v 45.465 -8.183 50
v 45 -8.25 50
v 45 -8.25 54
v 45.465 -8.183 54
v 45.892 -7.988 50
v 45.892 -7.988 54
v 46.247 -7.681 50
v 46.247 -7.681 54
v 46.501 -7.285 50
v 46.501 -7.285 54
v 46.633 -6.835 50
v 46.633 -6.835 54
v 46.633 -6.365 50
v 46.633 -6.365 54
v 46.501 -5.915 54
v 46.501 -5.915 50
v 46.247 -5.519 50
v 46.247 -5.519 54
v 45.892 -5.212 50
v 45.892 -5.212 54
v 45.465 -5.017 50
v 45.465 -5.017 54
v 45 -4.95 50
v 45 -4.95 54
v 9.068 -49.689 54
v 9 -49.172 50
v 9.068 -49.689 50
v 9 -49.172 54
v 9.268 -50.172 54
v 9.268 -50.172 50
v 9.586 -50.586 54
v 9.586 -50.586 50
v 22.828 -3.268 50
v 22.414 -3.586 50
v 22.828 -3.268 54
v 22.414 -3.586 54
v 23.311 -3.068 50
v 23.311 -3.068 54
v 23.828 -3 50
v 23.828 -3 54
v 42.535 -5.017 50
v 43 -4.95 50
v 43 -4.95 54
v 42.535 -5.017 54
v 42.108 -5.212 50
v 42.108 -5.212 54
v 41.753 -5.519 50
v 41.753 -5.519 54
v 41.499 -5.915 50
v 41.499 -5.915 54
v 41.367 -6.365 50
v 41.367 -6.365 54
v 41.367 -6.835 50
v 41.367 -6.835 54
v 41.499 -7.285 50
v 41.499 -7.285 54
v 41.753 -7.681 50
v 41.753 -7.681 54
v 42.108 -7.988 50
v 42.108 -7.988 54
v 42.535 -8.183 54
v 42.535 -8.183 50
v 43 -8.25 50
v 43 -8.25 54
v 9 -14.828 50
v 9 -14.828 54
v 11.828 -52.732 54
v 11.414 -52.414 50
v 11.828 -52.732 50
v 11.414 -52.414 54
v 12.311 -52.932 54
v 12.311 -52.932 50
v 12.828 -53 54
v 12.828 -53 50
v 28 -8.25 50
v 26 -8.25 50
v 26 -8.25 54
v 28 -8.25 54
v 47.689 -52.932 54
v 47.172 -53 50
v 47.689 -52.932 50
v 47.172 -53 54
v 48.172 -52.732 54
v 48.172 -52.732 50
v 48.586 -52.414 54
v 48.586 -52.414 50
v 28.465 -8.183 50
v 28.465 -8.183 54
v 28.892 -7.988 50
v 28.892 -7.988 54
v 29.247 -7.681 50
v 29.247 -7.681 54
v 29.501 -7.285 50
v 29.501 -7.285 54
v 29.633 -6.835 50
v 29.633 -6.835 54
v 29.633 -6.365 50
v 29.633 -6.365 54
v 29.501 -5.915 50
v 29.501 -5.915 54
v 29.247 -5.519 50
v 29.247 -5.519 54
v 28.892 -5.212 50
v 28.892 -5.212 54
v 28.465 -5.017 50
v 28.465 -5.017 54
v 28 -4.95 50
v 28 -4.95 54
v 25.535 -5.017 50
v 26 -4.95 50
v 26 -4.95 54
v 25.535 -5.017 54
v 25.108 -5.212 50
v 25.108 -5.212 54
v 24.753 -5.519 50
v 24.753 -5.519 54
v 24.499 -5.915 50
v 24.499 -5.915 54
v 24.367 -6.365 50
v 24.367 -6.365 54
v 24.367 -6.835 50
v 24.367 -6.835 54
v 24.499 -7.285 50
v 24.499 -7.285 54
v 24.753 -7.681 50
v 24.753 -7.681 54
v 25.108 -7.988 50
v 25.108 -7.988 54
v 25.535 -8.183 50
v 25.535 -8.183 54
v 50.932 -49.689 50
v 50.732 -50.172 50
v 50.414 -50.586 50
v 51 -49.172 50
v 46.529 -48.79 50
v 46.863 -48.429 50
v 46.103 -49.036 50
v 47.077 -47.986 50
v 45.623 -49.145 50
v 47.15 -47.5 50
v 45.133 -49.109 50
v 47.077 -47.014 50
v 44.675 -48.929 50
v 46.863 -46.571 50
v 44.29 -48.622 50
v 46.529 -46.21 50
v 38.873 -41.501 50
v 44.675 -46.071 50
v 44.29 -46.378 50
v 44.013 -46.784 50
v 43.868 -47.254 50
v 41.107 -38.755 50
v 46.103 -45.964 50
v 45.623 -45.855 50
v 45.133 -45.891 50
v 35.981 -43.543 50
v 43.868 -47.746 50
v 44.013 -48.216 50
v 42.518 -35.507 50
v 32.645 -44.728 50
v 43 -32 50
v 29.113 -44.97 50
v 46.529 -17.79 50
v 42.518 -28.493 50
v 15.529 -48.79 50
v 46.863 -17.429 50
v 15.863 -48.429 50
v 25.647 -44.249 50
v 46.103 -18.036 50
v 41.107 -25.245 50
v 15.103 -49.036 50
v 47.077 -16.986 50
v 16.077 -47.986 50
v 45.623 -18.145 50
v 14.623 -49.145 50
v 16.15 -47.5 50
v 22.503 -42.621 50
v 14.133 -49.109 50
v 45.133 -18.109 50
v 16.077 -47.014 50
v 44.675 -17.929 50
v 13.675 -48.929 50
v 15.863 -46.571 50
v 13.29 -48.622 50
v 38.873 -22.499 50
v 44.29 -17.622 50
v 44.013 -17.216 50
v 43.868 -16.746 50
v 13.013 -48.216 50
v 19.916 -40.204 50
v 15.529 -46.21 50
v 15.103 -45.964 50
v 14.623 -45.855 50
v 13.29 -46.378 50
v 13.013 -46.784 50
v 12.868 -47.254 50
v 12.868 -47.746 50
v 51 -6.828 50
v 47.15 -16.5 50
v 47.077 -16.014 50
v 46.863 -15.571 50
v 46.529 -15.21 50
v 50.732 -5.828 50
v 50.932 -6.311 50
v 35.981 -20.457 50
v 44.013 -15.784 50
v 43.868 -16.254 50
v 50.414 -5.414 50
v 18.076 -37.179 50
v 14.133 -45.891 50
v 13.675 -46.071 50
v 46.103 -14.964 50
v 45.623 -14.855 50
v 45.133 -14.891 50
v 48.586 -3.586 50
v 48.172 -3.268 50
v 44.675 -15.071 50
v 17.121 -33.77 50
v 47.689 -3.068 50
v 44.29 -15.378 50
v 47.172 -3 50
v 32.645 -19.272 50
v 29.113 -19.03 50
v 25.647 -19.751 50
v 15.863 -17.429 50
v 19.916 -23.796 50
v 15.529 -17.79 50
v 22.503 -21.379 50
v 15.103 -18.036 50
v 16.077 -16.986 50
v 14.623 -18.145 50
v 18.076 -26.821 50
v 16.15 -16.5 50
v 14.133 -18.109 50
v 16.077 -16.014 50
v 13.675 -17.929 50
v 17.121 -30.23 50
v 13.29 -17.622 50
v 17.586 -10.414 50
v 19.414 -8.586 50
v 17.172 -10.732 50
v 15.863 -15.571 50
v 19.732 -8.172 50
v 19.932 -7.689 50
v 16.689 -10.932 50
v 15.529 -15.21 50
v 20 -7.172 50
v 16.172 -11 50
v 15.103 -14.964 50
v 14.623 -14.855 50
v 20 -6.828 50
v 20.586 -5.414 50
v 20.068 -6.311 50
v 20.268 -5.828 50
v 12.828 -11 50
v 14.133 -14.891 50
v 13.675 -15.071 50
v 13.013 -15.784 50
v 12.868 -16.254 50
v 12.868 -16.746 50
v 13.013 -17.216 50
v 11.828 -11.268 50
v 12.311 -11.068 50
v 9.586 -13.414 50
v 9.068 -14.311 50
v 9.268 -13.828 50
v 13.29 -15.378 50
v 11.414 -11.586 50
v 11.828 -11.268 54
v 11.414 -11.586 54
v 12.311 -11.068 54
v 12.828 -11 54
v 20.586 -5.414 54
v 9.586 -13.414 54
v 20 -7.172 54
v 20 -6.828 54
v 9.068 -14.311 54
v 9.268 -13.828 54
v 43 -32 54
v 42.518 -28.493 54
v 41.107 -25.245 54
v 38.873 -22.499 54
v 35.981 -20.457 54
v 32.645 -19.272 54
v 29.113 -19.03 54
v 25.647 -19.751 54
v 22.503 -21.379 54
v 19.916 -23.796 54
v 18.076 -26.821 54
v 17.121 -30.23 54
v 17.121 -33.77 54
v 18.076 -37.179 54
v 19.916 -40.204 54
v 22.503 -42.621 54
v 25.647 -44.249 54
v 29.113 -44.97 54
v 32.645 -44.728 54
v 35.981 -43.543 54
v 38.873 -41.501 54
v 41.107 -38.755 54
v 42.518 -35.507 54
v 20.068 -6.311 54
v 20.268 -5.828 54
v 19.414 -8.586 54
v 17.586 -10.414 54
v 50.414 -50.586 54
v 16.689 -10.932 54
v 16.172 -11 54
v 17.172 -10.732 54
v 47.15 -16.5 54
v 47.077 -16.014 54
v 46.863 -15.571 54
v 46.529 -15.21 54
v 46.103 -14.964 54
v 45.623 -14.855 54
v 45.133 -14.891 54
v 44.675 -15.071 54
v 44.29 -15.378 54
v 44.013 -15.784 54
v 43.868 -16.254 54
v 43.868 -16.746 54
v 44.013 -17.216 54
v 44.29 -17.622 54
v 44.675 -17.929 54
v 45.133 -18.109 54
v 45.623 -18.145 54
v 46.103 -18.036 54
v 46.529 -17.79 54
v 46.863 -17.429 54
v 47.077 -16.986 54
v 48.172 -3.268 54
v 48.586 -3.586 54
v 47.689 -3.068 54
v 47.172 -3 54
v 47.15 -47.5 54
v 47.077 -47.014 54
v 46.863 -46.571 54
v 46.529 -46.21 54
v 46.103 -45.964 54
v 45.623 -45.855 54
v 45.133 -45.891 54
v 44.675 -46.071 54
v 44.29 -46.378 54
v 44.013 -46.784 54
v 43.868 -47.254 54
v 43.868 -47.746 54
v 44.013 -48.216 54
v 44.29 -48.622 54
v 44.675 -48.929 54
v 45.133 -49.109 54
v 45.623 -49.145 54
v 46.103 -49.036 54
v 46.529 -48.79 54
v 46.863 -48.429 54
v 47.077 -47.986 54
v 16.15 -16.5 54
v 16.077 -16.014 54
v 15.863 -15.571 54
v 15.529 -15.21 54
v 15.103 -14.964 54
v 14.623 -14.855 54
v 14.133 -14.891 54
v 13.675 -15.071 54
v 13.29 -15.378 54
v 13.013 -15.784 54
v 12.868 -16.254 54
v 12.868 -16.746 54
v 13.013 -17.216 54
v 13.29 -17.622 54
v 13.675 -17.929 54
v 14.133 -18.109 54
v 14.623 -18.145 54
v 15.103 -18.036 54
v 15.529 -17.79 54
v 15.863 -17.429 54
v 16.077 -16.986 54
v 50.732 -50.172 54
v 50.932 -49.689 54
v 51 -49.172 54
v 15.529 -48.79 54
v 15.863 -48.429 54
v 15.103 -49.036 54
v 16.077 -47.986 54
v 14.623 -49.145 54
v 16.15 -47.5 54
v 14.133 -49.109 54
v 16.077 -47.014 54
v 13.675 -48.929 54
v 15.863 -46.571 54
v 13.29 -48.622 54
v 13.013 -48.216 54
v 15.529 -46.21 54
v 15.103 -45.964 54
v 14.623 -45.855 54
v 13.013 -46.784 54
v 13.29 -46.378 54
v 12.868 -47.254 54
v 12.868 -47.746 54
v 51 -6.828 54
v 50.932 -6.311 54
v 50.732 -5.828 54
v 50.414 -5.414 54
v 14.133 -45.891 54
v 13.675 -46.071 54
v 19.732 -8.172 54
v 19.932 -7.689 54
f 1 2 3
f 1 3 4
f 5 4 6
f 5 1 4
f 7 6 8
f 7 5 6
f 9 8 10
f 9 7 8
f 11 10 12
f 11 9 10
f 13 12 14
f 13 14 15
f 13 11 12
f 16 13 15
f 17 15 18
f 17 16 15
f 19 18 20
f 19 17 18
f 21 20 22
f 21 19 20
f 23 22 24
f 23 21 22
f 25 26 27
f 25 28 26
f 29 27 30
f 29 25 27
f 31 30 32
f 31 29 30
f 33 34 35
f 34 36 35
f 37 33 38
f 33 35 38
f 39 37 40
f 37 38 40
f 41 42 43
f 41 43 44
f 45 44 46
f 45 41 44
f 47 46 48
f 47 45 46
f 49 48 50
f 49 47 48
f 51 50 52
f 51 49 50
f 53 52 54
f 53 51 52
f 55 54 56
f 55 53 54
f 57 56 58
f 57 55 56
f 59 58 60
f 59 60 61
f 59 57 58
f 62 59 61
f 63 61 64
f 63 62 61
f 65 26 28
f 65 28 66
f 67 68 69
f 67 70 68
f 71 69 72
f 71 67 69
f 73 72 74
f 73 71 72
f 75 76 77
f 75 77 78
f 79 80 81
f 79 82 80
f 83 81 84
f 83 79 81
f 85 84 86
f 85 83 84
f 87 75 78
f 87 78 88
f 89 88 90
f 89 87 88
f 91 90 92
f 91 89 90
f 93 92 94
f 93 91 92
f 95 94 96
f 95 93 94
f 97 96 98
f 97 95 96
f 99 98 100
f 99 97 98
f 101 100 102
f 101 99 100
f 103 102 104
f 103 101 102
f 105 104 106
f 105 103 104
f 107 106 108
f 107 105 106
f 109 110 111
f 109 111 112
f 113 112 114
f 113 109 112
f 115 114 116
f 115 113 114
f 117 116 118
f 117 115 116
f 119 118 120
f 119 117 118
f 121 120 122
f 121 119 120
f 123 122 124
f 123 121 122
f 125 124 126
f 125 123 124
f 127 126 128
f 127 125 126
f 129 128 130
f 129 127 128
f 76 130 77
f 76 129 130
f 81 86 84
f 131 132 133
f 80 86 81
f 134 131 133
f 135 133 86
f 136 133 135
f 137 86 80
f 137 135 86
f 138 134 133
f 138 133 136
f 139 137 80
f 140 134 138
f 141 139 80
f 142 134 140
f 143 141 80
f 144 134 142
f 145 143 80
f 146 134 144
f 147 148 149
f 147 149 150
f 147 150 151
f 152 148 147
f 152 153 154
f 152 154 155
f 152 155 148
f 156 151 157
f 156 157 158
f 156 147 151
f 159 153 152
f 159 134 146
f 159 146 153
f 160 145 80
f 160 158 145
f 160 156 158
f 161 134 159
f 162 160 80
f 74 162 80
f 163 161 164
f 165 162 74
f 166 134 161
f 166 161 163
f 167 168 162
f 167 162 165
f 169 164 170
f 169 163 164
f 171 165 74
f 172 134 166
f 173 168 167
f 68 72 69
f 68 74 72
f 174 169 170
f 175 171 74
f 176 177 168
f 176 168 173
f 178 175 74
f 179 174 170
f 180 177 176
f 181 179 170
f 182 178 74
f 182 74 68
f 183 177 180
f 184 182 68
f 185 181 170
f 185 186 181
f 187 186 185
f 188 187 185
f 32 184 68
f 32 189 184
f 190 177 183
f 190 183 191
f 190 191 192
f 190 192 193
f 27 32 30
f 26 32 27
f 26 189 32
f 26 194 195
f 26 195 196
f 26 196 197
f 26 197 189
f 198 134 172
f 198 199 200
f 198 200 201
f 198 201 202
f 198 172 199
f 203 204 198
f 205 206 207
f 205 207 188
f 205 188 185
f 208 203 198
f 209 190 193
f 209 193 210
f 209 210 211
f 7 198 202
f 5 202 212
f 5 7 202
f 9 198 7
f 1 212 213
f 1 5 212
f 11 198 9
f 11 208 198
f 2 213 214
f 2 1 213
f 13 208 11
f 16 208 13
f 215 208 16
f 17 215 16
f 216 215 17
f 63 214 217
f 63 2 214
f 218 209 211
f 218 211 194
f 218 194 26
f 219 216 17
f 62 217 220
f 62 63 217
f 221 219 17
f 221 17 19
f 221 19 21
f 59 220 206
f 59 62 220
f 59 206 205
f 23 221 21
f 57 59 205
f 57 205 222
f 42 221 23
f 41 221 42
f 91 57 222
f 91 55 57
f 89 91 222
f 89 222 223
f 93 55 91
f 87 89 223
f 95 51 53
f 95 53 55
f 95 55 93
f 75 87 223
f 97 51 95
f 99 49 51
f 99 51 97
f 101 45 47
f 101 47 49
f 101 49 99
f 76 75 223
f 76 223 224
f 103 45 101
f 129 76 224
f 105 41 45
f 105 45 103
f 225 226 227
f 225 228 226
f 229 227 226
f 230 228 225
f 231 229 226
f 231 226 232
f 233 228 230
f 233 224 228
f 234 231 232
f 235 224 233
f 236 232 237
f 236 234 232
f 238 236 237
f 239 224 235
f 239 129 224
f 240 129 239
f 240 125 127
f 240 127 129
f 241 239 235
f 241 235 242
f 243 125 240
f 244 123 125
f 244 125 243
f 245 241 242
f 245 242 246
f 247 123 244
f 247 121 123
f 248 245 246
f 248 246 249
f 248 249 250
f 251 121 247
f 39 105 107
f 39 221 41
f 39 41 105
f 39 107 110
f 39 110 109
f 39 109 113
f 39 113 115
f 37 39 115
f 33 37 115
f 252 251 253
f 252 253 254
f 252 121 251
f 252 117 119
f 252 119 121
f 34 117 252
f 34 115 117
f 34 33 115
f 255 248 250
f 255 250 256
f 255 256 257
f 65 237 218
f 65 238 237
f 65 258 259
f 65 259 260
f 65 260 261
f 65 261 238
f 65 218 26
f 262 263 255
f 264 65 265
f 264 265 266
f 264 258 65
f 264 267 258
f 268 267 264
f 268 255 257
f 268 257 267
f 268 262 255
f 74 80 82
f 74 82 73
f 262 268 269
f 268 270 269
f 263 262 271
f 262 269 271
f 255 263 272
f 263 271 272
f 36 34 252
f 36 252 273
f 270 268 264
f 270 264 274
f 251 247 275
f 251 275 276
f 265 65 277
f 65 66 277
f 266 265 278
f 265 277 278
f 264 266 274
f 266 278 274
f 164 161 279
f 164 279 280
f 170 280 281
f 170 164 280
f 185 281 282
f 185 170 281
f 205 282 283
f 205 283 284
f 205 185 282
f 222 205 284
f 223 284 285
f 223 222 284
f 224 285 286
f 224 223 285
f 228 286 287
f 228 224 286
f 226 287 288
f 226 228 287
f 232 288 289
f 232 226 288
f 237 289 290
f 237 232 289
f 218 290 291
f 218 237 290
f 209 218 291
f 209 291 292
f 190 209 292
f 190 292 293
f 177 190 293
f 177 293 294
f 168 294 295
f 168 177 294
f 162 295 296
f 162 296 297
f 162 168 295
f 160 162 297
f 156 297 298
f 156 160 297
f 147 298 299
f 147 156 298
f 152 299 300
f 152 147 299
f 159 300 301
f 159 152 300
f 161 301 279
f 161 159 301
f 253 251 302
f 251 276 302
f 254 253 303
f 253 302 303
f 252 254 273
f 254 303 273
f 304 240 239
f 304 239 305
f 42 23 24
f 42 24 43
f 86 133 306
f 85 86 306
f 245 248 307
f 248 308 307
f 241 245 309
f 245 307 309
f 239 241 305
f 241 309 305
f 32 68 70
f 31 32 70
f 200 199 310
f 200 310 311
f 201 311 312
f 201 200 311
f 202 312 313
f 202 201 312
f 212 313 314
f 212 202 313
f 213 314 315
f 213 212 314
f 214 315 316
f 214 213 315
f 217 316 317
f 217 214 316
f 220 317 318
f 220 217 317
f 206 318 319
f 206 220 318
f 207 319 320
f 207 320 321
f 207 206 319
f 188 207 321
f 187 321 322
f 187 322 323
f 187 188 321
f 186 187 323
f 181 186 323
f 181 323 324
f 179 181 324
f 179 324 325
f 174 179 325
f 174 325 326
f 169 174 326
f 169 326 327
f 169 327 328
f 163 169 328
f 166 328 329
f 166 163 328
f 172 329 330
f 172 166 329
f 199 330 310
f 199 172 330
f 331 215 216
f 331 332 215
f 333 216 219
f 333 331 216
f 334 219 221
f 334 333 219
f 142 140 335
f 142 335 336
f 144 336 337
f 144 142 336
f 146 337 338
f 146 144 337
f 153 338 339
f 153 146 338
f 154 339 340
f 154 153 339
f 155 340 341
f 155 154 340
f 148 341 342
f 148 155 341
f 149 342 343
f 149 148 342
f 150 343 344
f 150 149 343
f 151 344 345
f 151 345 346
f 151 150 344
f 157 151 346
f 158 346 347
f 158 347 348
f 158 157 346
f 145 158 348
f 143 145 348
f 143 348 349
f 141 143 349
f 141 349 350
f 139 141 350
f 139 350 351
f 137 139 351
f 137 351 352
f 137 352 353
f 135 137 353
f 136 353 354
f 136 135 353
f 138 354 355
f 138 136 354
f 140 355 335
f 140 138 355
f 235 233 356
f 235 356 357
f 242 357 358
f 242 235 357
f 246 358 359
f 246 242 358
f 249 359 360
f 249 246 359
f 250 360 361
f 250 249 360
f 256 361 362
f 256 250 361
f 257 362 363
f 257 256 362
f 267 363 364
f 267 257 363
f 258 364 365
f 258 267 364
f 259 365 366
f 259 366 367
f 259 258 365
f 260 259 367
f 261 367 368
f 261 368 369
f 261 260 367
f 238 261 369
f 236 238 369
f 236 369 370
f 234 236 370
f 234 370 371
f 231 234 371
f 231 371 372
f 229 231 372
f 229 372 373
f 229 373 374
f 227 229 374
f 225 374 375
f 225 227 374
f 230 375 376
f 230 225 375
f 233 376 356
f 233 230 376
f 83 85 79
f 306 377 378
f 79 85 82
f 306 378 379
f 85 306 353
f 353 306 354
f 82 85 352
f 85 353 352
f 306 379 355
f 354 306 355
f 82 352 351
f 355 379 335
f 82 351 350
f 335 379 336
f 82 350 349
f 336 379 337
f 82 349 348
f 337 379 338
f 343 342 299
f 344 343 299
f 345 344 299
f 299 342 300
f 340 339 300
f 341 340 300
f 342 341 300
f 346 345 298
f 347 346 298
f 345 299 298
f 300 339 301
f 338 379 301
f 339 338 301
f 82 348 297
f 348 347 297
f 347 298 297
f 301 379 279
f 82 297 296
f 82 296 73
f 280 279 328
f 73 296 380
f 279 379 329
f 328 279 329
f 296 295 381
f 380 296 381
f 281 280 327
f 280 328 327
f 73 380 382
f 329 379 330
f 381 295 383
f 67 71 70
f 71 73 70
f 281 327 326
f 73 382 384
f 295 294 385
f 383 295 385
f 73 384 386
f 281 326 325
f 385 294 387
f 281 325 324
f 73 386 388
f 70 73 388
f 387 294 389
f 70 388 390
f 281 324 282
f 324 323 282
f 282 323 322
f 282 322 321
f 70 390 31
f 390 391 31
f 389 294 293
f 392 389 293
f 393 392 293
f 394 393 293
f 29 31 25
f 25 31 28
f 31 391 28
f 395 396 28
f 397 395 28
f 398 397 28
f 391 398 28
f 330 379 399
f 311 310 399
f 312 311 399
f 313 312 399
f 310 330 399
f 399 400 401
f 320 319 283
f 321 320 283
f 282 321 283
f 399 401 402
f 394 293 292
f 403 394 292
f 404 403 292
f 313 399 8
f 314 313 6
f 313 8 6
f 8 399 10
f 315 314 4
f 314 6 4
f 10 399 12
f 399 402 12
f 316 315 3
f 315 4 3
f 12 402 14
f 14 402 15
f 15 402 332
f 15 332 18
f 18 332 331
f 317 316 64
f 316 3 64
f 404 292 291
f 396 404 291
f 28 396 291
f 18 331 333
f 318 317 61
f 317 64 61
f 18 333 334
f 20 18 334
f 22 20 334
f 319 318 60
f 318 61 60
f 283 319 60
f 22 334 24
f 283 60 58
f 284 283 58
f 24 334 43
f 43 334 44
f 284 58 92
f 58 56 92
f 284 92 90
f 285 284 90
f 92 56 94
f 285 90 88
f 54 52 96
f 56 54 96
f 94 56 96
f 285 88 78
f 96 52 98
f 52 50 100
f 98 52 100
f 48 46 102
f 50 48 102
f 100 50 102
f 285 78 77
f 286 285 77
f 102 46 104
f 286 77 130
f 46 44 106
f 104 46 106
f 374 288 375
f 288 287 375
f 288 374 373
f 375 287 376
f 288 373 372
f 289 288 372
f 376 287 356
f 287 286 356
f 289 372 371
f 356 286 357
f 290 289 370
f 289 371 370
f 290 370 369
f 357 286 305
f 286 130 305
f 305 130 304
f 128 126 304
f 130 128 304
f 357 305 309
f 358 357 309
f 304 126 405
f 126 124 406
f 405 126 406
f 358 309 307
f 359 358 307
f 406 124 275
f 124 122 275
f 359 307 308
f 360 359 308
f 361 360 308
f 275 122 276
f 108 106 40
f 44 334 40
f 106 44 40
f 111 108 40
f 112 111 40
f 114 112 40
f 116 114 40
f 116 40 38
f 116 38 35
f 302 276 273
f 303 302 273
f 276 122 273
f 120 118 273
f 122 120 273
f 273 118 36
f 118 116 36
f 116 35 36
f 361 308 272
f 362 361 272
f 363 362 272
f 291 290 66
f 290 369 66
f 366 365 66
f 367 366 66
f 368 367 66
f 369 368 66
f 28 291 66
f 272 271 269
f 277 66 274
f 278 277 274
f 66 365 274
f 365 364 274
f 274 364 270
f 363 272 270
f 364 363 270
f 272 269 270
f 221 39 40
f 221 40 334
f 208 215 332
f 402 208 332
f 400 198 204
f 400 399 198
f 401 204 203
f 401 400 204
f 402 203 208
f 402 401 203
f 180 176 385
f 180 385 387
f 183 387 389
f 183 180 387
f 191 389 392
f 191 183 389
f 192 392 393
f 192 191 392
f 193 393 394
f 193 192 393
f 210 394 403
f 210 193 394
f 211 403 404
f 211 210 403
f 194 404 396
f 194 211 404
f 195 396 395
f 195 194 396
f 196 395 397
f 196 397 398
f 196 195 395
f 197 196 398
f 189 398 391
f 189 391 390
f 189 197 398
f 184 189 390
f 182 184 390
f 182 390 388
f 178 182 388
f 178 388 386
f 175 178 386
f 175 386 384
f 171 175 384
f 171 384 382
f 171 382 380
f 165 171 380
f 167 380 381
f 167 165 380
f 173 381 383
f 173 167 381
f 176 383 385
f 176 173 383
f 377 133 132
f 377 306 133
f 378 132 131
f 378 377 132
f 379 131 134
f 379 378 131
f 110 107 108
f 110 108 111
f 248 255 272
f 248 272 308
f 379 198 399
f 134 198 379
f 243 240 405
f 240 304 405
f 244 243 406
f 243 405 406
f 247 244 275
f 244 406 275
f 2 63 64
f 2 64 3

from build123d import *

# Parameters (mm, degrees)
SKETCH026_R     = 13
SKETCH026_R_2   = 1.65
PAD013_DEPTH    = 4
CHAMFER009_SIZE = 3
FILLET002_R     = 2


with BuildPart() as part:
    # Sketch026 → Pad013 (new body)
    with BuildSketch(Plane.XY):
        Polygon((-21, -21), (-21, 21), (-10, 21), (-10, 29), (21, 29), (21, -21), align=None)
        Circle(SKETCH026_R, mode=Mode.SUBTRACT)
        with Locations((-15.5, 15.5)):
            Circle(SKETCH026_R_2, mode=Mode.SUBTRACT)
        with Locations((15.5, 15.5)):
            Circle(SKETCH026_R_2, mode=Mode.SUBTRACT)
        with Locations((15.5, -15.5)):
            Circle(SKETCH026_R_2, mode=Mode.SUBTRACT)
        with Locations((-15.5, -15.5)):
            Circle(SKETCH026_R_2, mode=Mode.SUBTRACT)
        with BuildLine():
            ThreePointArc((-4, 27.05), (-5.65, 25.4), (-4, 23.75))
            Line((-4, 23.75), (-2, 23.75))
            ThreePointArc((-2, 23.75), (-0.35, 25.4), (-2, 27.05))
            Line((-2, 27.05), (-4, 27.05))
        make_face(mode=Mode.SUBTRACT)
        with BuildLine():
            ThreePointArc((13, 27.05), (11.35, 25.4), (13, 23.75))
            Line((13, 23.75), (15, 23.75))
            ThreePointArc((15, 23.75), (16.65, 25.4), (15, 27.05))
            Line((15, 27.05), (13, 27.05))
        make_face(mode=Mode.SUBTRACT)
    extrude(amount=PAD013_DEPTH)

    # Chamfer009
    chamfer009_edges = [part.edges().sort_by_distance(p)[0] for p in [
        (-10, 29, 2),
        (-10, 21, 2),
        (21, 29, 2),
        (21, -21, 2),
        (-21, -21, 2),
        (-21, 21, 2),
    ]]
    chamfer(chamfer009_edges, length=CHAMFER009_SIZE)

    # Fillet002
    fillet002_edges = [part.edges().sort_by_distance(p)[0] for p in [
        (21, 26, 2),
        (18, 29, 2),
        (21, -18, 2),
        (18, -21, 2),
        (-18, -21, 2),
        (-21, -18, 2),
        (-18, 21, 2),
        (-21, 18, 2),
        (-13, 21, 2),
        (-10, 24, 2),
        (-10, 26, 2),
        (-7, 29, 2),
    ]]
    fillet(fillet002_edges, radius=FILLET002_R)


with BuildPart() as part_1:
    # Body011 placement: moved
    add(part.part.moved(Location((30, -32, 50))))


solid = part_1.part
